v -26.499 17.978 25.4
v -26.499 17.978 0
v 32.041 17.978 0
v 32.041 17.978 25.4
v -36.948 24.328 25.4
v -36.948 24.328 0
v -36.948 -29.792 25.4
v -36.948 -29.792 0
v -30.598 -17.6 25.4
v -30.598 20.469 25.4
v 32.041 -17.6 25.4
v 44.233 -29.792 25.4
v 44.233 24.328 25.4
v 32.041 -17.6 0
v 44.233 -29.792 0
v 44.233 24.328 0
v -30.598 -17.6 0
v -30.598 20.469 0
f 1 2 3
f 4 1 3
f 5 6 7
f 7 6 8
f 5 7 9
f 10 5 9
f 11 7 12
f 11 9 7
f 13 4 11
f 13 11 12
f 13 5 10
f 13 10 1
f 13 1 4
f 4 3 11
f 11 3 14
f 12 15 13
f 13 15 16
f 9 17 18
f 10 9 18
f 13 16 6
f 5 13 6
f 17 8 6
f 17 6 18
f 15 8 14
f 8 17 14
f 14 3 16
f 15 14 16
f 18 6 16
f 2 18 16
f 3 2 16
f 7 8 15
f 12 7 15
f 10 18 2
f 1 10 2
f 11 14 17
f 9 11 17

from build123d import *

# Parameters (mm, degrees)
F0_W     = 6.35
F0_H     = 12.1919997036
F0_H_2   = 35.5785874814
F0_W_2   = 12.1919997036
F0_H_3   = 6.35
F1_DEPTH = 25.4


with BuildPart() as f1:
    # F0 (on Top) → F1 (new body)
    with BuildSketch(Plane.XY):
        with Locations((-33.7727085769, -23.6963424832)):
            Rectangle(F0_W, F0_H)
        Polygon((-30.5977085769, -17.6003426313), (-30.5977085769, -29.792342335), (44.2331731319, -29.792342335), (44.2331731319, 17.97824485), (32.0411734283, 17.97824485), (32.0411734283, -17.6003426313), align=None)
        with Locations((-33.7727085769, 0.1889511093)):
            Rectangle(F0_W, F0_H_2)
        Polygon((-36.9477085769, 24.32824485), (-36.9477085769, 17.97824485), (-30.5977085769, 17.97824485), (-30.5977085769, 20.4689776353), align=None)
        with Locations((38.1371732801, 21.15324485)):
            Rectangle(F0_W_2, F0_H_3)
        Polygon((-30.5977085769, 24.32824485), (-36.9477085769, 24.32824485), (-30.5977085769, 20.4689776353), align=None)
        Polygon((-26.4994815545, 17.97824485), (32.0411734283, 17.97824485), (32.0411734283, 24.32824485), (-30.5977085769, 24.32824485), (-30.5977085769, 20.4689776353), align=None)
    extrude(amount=F1_DEPTH)


solid = f1.part
